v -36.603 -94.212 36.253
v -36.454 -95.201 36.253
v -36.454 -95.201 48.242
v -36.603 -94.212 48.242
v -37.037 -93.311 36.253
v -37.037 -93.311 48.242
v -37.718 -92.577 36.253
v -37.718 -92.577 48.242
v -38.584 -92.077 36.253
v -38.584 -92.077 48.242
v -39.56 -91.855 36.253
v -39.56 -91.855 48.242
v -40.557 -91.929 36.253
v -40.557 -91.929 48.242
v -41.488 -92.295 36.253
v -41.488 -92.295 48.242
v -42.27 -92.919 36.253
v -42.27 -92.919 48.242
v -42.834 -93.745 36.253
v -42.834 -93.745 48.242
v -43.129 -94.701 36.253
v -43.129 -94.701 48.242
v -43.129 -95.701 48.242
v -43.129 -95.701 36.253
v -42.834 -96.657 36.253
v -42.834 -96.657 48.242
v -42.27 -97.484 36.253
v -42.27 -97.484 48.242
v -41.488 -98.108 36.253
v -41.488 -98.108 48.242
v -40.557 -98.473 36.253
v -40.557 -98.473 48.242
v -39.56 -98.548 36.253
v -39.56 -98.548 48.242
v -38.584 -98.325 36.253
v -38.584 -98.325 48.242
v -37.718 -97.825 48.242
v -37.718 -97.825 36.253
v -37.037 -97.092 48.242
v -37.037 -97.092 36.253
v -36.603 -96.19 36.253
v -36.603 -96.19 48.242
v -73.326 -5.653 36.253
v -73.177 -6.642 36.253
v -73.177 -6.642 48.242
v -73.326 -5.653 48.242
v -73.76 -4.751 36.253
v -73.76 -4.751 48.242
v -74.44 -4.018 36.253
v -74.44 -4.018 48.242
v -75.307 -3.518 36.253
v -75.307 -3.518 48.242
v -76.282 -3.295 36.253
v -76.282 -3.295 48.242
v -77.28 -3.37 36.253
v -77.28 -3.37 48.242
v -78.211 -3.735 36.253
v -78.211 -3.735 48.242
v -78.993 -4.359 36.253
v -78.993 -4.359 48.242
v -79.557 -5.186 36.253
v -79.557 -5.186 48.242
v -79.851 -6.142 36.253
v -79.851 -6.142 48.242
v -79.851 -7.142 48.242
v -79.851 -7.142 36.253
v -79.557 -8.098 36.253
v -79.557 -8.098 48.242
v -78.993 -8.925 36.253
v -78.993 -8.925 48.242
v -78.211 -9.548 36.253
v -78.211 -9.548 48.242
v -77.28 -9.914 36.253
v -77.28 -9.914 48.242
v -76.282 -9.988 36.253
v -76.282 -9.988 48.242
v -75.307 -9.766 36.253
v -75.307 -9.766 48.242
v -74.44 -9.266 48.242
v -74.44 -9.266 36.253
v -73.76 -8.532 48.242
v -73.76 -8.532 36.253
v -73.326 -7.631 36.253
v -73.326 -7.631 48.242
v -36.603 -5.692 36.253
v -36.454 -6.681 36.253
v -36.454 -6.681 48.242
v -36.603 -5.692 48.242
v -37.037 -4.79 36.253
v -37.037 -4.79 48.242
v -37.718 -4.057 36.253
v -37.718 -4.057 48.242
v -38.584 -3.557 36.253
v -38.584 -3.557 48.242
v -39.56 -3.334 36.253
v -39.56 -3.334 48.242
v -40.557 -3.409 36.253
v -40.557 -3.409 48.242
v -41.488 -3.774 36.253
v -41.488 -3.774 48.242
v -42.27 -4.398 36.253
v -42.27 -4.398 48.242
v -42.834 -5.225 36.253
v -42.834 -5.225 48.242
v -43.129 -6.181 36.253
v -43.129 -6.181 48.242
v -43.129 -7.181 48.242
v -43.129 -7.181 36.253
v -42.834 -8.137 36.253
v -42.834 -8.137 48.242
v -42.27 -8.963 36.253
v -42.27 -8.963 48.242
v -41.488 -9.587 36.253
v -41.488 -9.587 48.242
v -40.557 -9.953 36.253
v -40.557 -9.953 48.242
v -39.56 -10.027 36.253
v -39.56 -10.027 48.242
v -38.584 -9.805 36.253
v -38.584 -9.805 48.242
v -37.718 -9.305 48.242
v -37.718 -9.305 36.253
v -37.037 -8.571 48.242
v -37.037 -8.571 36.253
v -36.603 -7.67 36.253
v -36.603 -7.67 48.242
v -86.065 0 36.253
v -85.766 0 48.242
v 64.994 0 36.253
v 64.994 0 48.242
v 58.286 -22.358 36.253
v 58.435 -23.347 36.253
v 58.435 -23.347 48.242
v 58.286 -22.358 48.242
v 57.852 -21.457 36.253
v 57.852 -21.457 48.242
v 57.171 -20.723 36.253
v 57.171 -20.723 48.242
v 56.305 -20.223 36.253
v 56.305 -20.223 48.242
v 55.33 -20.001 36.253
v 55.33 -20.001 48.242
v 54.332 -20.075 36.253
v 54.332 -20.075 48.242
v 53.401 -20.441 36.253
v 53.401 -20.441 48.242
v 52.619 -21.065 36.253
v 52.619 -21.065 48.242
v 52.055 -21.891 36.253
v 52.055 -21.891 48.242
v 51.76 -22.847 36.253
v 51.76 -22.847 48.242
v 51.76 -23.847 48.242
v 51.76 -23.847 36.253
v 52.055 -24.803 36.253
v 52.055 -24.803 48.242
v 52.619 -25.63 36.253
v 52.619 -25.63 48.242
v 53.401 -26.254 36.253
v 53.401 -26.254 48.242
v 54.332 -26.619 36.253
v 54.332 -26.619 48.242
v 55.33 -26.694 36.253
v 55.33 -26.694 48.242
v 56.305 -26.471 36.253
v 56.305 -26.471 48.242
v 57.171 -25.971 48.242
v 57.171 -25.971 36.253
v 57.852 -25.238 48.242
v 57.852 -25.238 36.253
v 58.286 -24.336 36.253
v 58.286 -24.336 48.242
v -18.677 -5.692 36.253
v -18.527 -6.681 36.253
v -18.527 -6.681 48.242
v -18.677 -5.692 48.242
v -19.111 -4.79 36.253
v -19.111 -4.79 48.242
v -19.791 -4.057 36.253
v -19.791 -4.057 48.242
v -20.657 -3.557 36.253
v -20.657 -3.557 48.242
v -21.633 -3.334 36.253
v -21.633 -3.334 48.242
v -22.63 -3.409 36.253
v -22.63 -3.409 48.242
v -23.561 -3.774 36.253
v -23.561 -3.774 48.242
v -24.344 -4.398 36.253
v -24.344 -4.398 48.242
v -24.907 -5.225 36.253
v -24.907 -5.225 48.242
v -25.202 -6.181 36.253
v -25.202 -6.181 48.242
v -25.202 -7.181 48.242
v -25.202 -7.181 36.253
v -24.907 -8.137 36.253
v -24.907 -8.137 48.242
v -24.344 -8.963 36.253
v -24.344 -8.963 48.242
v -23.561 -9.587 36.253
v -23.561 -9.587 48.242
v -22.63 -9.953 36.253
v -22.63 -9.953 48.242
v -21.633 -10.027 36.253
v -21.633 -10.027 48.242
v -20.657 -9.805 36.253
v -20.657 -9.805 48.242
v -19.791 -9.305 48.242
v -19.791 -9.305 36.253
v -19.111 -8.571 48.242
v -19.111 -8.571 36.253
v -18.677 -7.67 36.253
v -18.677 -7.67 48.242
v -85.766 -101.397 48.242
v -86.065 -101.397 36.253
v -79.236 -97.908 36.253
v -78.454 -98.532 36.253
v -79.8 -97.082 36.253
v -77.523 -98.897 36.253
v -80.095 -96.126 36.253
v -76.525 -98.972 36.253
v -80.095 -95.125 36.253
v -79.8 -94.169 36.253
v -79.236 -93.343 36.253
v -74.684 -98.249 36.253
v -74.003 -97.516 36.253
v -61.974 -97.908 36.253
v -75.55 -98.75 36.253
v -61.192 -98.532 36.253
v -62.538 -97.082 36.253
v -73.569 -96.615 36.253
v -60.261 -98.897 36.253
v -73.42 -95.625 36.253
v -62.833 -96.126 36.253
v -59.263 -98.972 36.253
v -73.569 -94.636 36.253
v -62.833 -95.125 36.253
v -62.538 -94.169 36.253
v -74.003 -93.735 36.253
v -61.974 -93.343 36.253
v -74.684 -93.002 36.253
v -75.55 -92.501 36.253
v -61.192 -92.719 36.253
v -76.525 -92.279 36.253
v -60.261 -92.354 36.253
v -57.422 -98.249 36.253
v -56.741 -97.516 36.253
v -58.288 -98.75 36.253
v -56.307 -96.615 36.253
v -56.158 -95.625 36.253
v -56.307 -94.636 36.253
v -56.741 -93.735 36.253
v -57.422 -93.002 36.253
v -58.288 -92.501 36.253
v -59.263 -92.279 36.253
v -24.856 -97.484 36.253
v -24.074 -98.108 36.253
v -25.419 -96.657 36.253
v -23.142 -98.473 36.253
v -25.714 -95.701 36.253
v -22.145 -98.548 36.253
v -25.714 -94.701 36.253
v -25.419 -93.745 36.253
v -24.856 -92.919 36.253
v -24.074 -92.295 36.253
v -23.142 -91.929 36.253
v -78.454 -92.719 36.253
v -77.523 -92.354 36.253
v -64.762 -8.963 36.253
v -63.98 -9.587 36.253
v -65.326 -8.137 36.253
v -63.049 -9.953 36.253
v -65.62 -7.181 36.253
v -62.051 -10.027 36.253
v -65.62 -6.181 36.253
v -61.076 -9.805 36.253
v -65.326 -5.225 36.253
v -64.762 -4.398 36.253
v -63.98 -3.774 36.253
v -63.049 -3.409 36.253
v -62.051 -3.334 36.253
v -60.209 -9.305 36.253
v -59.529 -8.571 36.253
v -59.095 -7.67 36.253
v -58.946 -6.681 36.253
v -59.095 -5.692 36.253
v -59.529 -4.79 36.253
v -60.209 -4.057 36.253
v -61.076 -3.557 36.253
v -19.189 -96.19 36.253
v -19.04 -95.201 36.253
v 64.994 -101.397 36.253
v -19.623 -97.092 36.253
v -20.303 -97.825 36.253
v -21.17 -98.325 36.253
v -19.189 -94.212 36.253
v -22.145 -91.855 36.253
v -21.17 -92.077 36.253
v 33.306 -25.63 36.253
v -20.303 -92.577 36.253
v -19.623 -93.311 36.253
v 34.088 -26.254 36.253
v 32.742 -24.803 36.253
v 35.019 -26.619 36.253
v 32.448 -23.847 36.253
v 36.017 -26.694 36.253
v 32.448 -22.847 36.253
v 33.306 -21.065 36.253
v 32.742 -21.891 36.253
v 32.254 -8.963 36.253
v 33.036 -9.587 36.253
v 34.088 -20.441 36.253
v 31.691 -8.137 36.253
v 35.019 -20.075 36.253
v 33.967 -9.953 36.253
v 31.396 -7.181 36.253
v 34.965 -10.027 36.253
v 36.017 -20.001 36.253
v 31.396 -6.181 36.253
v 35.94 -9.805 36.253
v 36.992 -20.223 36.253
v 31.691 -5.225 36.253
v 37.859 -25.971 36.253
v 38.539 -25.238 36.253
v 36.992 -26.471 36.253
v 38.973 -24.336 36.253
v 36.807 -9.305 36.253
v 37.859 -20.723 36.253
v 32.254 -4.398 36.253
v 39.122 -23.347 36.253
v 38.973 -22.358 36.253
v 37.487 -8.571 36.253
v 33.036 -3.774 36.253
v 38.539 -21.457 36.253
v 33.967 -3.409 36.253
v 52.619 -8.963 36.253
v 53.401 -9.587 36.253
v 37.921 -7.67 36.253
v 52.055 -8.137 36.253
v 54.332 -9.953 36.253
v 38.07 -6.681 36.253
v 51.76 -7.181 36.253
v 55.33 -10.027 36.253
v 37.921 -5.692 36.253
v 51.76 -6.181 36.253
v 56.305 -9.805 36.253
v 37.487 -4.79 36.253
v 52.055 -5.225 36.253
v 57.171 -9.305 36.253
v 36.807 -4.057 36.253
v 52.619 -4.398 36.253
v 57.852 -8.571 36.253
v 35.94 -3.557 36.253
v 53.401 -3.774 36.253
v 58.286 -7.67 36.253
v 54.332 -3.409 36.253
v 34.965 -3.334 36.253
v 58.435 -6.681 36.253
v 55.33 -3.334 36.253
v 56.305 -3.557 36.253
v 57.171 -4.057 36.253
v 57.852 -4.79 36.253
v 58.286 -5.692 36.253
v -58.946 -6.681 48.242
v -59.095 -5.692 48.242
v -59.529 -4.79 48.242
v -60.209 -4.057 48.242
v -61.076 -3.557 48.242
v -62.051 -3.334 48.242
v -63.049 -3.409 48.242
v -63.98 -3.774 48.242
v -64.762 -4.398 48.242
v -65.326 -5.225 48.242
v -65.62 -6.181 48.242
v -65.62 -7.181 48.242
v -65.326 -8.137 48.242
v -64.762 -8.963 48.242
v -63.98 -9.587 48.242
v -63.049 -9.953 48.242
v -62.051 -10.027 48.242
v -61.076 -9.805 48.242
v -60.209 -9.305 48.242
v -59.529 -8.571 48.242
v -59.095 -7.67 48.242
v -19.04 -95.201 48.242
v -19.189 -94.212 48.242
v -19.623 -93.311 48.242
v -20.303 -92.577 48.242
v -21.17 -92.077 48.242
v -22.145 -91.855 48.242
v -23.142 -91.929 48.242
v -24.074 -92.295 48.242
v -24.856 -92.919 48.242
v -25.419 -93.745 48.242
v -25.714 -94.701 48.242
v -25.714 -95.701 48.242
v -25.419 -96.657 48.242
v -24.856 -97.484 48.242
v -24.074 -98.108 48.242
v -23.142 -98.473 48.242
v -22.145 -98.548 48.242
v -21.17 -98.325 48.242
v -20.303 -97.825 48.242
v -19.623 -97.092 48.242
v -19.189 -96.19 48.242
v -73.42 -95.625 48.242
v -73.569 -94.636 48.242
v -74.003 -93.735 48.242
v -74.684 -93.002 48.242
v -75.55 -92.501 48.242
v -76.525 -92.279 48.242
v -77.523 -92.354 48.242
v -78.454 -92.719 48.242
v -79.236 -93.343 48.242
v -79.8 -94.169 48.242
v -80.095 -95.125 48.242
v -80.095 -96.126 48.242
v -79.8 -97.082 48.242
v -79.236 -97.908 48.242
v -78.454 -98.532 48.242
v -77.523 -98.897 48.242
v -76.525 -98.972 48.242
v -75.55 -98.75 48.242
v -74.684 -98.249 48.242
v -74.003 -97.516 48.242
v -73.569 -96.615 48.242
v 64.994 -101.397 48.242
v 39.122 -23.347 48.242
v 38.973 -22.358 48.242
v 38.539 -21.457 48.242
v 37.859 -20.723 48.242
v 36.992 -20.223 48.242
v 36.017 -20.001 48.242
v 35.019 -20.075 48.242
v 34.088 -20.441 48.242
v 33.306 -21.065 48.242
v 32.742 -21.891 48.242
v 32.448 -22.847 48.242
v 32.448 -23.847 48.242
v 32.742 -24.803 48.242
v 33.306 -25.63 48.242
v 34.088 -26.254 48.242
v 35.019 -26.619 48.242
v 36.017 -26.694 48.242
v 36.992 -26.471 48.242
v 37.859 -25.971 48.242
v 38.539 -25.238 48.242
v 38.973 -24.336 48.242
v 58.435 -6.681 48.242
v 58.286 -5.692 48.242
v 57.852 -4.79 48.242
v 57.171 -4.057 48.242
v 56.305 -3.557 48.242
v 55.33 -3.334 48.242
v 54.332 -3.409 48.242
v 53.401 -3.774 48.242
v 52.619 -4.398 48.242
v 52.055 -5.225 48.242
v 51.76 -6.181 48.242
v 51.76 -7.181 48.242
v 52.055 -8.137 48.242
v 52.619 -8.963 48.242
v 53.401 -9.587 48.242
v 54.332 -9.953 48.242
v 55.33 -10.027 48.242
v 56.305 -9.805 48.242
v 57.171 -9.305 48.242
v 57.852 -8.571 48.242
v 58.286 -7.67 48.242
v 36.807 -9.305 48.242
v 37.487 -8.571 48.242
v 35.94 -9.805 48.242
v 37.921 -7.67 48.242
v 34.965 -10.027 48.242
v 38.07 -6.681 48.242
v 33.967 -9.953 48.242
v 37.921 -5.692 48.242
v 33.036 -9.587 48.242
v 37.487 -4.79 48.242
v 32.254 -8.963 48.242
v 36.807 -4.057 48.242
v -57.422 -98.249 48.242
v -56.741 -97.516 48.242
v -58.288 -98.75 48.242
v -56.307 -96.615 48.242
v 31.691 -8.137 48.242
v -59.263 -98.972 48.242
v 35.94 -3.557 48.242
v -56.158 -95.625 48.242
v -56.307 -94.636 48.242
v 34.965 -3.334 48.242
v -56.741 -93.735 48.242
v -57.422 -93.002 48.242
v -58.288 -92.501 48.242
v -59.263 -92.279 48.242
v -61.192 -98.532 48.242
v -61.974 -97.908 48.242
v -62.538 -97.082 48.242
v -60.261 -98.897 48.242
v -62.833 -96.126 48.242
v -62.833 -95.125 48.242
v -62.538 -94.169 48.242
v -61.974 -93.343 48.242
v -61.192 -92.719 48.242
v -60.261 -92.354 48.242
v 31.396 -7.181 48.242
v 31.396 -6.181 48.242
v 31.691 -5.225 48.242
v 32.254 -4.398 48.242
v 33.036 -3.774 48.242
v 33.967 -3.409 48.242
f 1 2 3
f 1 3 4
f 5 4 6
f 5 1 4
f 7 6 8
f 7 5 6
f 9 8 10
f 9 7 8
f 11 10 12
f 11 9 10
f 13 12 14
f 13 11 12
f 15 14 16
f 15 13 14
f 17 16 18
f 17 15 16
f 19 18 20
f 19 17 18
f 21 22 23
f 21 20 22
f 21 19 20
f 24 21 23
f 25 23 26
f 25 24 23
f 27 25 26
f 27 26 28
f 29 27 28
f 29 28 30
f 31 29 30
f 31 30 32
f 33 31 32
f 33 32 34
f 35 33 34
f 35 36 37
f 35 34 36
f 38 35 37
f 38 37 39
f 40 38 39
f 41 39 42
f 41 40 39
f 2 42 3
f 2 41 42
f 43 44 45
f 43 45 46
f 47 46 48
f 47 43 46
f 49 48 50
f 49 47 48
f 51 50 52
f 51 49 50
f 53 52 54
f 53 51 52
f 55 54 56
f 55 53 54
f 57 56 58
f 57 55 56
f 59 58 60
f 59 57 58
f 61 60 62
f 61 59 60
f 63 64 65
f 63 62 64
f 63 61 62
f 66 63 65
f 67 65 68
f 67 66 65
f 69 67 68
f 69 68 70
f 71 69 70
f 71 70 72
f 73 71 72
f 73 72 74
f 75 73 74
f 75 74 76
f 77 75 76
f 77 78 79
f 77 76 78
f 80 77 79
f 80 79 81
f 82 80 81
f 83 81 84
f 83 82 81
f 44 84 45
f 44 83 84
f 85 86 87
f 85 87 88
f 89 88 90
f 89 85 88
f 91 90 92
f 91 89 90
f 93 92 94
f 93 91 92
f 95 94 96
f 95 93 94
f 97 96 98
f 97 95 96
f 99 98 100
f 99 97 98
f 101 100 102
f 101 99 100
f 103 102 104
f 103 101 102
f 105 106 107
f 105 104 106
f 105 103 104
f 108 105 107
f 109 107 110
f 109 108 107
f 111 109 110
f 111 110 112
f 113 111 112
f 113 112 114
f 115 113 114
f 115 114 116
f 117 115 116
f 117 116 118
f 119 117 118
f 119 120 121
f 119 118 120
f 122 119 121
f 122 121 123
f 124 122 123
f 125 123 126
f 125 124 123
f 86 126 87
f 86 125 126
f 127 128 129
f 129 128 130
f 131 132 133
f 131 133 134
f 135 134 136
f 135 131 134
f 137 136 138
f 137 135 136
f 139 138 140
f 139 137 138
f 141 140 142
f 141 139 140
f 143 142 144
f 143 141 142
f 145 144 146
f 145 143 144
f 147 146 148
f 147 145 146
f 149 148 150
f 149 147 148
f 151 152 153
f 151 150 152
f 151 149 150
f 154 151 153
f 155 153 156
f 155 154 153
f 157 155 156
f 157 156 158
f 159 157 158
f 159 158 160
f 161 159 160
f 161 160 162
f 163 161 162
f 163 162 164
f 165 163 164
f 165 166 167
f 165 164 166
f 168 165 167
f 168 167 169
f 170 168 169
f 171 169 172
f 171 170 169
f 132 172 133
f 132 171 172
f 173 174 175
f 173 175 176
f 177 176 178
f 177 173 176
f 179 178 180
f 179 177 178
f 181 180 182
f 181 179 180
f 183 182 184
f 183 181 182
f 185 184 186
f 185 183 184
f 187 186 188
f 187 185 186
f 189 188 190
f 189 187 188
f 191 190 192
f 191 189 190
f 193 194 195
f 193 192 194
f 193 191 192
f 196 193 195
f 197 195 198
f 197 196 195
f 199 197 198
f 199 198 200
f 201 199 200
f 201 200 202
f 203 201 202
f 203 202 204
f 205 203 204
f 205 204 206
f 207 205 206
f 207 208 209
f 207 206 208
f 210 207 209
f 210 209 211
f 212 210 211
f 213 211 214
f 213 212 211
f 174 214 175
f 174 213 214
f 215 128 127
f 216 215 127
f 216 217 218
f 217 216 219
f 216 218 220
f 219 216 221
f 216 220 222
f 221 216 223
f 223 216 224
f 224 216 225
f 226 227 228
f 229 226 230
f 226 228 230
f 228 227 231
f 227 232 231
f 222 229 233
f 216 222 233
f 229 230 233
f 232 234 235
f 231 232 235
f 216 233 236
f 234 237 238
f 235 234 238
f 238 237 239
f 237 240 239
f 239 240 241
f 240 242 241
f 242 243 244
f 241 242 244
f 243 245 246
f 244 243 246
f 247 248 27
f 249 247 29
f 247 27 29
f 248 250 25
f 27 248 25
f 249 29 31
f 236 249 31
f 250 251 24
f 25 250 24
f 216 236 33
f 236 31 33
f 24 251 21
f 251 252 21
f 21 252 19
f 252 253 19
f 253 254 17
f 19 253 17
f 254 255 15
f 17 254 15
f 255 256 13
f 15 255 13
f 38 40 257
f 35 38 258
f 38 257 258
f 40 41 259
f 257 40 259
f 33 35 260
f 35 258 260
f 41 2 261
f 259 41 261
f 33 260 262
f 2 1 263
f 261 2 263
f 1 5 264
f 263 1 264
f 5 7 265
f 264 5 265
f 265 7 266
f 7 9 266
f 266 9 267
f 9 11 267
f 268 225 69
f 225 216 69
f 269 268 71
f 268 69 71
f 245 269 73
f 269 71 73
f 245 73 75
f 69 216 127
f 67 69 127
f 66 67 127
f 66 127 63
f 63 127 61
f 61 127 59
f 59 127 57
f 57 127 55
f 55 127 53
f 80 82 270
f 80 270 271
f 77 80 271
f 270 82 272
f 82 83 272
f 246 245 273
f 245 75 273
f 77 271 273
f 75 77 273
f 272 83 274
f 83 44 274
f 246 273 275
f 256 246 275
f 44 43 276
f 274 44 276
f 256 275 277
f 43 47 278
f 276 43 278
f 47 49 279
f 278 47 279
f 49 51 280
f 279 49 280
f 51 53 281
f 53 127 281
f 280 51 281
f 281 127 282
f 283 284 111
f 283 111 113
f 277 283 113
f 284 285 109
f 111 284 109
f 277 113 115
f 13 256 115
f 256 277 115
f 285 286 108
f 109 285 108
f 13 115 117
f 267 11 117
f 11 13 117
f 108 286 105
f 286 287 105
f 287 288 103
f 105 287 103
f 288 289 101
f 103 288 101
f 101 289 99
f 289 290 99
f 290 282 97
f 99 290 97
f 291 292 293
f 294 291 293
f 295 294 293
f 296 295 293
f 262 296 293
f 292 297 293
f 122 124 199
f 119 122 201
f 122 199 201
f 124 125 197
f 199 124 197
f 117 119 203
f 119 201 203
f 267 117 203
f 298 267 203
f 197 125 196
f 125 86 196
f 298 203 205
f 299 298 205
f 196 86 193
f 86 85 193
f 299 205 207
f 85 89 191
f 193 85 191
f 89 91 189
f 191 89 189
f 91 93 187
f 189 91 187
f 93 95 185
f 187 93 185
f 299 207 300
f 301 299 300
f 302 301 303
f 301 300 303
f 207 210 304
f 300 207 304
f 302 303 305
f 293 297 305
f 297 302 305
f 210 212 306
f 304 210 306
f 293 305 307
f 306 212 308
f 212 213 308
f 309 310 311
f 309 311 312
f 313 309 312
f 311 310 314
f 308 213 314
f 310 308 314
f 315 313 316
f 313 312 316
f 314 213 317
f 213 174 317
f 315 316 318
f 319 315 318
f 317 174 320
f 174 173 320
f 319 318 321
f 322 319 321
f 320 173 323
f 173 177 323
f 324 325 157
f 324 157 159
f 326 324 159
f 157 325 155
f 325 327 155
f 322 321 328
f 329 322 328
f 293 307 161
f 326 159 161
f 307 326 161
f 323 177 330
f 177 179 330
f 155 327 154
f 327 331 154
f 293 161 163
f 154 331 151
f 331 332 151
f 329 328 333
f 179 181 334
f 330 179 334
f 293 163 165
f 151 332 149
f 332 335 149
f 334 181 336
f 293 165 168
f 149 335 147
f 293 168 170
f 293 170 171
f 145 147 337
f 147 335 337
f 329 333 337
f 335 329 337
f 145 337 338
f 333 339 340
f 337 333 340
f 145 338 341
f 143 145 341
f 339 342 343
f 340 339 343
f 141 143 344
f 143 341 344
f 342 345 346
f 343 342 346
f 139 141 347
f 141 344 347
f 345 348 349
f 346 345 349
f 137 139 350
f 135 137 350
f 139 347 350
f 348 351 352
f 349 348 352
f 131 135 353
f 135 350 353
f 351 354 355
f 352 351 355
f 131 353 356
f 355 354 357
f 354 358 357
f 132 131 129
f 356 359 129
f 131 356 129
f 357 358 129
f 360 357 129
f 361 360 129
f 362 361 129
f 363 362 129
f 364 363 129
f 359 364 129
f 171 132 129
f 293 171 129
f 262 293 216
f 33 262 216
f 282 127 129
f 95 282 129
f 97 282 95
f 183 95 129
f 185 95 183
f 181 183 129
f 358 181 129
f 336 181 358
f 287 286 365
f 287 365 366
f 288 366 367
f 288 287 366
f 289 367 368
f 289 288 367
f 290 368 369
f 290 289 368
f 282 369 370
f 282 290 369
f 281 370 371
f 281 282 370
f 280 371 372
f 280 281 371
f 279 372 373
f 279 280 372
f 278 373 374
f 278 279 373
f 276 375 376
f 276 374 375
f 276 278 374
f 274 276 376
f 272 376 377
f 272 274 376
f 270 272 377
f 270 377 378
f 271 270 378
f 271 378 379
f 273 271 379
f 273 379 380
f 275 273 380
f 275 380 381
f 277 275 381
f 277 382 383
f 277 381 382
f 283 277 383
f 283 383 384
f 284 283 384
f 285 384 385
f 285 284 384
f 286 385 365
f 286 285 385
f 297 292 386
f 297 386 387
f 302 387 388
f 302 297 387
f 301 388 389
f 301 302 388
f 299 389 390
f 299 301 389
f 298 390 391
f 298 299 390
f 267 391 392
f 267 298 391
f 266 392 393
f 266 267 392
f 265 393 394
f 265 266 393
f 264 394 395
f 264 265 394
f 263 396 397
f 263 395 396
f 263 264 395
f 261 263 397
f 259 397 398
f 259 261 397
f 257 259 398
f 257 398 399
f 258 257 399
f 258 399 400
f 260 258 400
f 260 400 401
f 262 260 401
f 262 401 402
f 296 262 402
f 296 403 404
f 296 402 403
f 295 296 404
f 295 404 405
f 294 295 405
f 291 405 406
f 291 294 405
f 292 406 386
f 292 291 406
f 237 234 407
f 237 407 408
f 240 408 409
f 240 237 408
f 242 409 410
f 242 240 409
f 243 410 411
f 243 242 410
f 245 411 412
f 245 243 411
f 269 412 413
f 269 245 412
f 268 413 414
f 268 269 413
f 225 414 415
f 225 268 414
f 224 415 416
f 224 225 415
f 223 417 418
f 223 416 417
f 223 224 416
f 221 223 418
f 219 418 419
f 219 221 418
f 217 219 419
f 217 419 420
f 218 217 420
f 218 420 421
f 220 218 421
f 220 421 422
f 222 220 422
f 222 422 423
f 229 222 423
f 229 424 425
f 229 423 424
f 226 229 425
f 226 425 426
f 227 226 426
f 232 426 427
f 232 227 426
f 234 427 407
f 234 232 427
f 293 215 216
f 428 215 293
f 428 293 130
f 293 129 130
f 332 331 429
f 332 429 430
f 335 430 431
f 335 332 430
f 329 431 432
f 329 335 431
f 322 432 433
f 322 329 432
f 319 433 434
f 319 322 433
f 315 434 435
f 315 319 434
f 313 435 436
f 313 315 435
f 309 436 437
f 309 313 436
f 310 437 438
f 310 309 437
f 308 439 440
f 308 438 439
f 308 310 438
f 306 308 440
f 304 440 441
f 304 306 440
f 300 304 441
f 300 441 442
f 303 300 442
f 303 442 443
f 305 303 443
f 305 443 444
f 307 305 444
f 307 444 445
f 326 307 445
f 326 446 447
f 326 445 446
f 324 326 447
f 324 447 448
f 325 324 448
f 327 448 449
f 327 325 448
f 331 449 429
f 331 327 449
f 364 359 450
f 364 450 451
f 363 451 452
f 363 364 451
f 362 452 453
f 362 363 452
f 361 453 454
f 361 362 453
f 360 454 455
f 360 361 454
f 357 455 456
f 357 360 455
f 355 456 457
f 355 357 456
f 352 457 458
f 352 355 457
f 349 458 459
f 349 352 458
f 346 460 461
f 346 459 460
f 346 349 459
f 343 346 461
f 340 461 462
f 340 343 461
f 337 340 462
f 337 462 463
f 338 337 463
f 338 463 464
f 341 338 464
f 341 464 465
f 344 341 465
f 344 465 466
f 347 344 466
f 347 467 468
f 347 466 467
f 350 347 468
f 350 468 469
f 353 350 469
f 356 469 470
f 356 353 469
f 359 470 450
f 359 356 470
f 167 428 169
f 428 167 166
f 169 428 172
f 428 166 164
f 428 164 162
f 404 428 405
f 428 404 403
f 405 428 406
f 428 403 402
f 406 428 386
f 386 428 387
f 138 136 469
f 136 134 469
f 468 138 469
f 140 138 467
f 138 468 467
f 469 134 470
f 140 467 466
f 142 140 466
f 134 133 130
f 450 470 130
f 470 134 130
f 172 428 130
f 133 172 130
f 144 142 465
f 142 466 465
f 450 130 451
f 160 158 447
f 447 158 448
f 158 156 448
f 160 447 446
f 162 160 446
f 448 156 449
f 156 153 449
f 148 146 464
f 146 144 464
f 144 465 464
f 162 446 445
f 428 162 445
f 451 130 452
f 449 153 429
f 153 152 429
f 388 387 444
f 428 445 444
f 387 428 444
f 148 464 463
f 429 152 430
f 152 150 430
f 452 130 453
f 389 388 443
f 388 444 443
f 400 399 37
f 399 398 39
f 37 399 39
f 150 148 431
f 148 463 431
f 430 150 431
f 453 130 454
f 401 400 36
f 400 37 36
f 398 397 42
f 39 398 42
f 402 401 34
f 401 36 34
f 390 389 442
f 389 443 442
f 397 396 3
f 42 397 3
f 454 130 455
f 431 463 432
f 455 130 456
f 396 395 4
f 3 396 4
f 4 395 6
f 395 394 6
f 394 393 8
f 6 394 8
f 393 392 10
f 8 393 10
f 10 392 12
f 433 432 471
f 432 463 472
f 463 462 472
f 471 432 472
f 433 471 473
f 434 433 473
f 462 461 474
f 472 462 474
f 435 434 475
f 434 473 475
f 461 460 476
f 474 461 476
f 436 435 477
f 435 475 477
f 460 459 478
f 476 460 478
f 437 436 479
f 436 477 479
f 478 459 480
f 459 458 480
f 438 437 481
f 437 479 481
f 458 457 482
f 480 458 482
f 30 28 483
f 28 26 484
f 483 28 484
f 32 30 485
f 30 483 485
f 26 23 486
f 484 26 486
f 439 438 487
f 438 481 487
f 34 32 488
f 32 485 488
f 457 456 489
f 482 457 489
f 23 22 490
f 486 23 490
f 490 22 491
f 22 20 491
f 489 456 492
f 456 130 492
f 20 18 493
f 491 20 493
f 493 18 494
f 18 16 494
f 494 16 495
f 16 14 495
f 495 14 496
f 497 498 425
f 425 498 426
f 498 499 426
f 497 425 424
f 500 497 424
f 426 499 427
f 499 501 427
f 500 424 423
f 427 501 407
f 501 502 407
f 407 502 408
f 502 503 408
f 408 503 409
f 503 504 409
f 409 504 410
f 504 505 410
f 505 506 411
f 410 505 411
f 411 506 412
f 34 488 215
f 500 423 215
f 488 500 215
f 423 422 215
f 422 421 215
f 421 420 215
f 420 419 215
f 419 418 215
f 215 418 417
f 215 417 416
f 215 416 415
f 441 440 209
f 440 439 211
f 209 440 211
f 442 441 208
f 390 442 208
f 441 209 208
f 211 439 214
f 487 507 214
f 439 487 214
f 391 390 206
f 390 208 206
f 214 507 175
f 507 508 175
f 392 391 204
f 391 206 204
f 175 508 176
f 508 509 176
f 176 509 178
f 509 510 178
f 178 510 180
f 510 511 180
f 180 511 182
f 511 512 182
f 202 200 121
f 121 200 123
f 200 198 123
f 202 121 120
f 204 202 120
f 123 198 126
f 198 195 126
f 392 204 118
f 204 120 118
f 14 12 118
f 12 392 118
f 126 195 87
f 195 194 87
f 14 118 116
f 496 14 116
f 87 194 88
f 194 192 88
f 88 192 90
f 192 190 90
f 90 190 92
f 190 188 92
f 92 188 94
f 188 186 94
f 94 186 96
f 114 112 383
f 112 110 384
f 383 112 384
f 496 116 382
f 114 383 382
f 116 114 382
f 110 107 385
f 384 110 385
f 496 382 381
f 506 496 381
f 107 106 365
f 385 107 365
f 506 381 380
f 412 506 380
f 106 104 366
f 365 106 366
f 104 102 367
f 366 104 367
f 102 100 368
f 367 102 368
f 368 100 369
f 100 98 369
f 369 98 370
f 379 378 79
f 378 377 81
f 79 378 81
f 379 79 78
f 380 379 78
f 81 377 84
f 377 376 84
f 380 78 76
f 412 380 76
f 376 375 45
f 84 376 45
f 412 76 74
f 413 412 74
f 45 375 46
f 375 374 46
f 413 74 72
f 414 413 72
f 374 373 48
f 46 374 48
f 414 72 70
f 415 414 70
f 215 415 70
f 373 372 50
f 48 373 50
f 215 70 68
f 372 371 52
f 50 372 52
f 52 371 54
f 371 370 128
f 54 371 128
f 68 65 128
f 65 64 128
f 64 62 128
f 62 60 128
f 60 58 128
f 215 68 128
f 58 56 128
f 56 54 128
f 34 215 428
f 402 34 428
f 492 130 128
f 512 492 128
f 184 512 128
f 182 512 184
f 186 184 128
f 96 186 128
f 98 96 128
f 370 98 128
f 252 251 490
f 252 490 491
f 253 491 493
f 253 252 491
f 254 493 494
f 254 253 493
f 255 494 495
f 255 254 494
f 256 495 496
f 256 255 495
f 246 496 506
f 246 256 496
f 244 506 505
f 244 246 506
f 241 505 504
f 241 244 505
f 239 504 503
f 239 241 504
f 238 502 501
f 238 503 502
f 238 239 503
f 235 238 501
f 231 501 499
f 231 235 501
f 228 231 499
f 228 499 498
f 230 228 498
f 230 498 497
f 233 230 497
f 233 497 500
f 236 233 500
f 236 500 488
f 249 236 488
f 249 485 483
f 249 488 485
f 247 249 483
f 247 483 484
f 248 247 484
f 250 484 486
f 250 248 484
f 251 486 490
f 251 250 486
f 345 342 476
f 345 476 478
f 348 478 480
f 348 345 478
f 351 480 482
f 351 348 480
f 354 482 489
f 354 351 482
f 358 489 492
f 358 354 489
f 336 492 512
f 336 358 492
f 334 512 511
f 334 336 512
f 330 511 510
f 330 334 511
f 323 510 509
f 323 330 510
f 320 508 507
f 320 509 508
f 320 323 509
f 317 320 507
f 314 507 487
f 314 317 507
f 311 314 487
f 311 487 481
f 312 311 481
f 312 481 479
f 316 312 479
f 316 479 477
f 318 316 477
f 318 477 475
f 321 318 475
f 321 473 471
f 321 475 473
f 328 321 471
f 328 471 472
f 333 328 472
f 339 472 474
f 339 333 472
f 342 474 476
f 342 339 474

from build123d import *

# Parameters (mm, degrees)
F1_DEPTH = 25.4
F2_DEPTH = 75.9968
F3_R     = 3.356014
F4_DEPTH = 56.388


with BuildPart() as f1:
    # F0 (on Front) → F1 (new body)
    with BuildSketch(Plane.XZ):
        Polygon((64.99356, 48.242185), (-85.765576, 48.242185), (-86.065296, 36.253385), (64.99356, 36.253385), align=None)
    extrude(amount=F1_DEPTH)

    # F1_face (on face) → F2 (join)
    with BuildSketch(Plane(origin=(-10.460963, -25.4, 42.245801), x_dir=(1, 0, 0), z_dir=(0, -1, 0))):
        Polygon((-75.604333, -5.992416), (75.454523, -5.992416), (75.454523, 5.996384), (-75.304613, 5.996384), align=None)
    extrude(amount=F2_DEPTH)

    # F3 (on Top) → F4 (cut)
    with BuildSketch(Plane.XY):
        with Locations((-76.532871, -6.641844)):
            Circle(F3_R)
        with Locations((-62.301904, -6.680765)):
            Circle(F3_R)
        with Locations((-76.775998, -95.625482)):
            Circle(F3_R)
        with Locations((-59.514143, -95.625482)):
            Circle(F3_R)
        with Locations((-39.810318, -6.680765)):
            Circle(F3_R)
        with Locations((-21.883452, -6.680765)):
            Circle(F3_R)
        with Locations((-39.810318, -95.201291)):
            Circle(F3_R)
        with Locations((-22.395648, -95.201291)):
            Circle(F3_R)
        with Locations((34.714222, -6.680765)):
            Circle(F3_R)
        with Locations((55.078939, -6.680765)):
            Circle(F3_R)
        with Locations((55.078939, -23.347175)):
            Circle(F3_R)
        with Locations((35.766117, -23.347175)):
            Circle(F3_R)
    extrude(amount=F4_DEPTH, mode=Mode.SUBTRACT)


solid = f1.part
